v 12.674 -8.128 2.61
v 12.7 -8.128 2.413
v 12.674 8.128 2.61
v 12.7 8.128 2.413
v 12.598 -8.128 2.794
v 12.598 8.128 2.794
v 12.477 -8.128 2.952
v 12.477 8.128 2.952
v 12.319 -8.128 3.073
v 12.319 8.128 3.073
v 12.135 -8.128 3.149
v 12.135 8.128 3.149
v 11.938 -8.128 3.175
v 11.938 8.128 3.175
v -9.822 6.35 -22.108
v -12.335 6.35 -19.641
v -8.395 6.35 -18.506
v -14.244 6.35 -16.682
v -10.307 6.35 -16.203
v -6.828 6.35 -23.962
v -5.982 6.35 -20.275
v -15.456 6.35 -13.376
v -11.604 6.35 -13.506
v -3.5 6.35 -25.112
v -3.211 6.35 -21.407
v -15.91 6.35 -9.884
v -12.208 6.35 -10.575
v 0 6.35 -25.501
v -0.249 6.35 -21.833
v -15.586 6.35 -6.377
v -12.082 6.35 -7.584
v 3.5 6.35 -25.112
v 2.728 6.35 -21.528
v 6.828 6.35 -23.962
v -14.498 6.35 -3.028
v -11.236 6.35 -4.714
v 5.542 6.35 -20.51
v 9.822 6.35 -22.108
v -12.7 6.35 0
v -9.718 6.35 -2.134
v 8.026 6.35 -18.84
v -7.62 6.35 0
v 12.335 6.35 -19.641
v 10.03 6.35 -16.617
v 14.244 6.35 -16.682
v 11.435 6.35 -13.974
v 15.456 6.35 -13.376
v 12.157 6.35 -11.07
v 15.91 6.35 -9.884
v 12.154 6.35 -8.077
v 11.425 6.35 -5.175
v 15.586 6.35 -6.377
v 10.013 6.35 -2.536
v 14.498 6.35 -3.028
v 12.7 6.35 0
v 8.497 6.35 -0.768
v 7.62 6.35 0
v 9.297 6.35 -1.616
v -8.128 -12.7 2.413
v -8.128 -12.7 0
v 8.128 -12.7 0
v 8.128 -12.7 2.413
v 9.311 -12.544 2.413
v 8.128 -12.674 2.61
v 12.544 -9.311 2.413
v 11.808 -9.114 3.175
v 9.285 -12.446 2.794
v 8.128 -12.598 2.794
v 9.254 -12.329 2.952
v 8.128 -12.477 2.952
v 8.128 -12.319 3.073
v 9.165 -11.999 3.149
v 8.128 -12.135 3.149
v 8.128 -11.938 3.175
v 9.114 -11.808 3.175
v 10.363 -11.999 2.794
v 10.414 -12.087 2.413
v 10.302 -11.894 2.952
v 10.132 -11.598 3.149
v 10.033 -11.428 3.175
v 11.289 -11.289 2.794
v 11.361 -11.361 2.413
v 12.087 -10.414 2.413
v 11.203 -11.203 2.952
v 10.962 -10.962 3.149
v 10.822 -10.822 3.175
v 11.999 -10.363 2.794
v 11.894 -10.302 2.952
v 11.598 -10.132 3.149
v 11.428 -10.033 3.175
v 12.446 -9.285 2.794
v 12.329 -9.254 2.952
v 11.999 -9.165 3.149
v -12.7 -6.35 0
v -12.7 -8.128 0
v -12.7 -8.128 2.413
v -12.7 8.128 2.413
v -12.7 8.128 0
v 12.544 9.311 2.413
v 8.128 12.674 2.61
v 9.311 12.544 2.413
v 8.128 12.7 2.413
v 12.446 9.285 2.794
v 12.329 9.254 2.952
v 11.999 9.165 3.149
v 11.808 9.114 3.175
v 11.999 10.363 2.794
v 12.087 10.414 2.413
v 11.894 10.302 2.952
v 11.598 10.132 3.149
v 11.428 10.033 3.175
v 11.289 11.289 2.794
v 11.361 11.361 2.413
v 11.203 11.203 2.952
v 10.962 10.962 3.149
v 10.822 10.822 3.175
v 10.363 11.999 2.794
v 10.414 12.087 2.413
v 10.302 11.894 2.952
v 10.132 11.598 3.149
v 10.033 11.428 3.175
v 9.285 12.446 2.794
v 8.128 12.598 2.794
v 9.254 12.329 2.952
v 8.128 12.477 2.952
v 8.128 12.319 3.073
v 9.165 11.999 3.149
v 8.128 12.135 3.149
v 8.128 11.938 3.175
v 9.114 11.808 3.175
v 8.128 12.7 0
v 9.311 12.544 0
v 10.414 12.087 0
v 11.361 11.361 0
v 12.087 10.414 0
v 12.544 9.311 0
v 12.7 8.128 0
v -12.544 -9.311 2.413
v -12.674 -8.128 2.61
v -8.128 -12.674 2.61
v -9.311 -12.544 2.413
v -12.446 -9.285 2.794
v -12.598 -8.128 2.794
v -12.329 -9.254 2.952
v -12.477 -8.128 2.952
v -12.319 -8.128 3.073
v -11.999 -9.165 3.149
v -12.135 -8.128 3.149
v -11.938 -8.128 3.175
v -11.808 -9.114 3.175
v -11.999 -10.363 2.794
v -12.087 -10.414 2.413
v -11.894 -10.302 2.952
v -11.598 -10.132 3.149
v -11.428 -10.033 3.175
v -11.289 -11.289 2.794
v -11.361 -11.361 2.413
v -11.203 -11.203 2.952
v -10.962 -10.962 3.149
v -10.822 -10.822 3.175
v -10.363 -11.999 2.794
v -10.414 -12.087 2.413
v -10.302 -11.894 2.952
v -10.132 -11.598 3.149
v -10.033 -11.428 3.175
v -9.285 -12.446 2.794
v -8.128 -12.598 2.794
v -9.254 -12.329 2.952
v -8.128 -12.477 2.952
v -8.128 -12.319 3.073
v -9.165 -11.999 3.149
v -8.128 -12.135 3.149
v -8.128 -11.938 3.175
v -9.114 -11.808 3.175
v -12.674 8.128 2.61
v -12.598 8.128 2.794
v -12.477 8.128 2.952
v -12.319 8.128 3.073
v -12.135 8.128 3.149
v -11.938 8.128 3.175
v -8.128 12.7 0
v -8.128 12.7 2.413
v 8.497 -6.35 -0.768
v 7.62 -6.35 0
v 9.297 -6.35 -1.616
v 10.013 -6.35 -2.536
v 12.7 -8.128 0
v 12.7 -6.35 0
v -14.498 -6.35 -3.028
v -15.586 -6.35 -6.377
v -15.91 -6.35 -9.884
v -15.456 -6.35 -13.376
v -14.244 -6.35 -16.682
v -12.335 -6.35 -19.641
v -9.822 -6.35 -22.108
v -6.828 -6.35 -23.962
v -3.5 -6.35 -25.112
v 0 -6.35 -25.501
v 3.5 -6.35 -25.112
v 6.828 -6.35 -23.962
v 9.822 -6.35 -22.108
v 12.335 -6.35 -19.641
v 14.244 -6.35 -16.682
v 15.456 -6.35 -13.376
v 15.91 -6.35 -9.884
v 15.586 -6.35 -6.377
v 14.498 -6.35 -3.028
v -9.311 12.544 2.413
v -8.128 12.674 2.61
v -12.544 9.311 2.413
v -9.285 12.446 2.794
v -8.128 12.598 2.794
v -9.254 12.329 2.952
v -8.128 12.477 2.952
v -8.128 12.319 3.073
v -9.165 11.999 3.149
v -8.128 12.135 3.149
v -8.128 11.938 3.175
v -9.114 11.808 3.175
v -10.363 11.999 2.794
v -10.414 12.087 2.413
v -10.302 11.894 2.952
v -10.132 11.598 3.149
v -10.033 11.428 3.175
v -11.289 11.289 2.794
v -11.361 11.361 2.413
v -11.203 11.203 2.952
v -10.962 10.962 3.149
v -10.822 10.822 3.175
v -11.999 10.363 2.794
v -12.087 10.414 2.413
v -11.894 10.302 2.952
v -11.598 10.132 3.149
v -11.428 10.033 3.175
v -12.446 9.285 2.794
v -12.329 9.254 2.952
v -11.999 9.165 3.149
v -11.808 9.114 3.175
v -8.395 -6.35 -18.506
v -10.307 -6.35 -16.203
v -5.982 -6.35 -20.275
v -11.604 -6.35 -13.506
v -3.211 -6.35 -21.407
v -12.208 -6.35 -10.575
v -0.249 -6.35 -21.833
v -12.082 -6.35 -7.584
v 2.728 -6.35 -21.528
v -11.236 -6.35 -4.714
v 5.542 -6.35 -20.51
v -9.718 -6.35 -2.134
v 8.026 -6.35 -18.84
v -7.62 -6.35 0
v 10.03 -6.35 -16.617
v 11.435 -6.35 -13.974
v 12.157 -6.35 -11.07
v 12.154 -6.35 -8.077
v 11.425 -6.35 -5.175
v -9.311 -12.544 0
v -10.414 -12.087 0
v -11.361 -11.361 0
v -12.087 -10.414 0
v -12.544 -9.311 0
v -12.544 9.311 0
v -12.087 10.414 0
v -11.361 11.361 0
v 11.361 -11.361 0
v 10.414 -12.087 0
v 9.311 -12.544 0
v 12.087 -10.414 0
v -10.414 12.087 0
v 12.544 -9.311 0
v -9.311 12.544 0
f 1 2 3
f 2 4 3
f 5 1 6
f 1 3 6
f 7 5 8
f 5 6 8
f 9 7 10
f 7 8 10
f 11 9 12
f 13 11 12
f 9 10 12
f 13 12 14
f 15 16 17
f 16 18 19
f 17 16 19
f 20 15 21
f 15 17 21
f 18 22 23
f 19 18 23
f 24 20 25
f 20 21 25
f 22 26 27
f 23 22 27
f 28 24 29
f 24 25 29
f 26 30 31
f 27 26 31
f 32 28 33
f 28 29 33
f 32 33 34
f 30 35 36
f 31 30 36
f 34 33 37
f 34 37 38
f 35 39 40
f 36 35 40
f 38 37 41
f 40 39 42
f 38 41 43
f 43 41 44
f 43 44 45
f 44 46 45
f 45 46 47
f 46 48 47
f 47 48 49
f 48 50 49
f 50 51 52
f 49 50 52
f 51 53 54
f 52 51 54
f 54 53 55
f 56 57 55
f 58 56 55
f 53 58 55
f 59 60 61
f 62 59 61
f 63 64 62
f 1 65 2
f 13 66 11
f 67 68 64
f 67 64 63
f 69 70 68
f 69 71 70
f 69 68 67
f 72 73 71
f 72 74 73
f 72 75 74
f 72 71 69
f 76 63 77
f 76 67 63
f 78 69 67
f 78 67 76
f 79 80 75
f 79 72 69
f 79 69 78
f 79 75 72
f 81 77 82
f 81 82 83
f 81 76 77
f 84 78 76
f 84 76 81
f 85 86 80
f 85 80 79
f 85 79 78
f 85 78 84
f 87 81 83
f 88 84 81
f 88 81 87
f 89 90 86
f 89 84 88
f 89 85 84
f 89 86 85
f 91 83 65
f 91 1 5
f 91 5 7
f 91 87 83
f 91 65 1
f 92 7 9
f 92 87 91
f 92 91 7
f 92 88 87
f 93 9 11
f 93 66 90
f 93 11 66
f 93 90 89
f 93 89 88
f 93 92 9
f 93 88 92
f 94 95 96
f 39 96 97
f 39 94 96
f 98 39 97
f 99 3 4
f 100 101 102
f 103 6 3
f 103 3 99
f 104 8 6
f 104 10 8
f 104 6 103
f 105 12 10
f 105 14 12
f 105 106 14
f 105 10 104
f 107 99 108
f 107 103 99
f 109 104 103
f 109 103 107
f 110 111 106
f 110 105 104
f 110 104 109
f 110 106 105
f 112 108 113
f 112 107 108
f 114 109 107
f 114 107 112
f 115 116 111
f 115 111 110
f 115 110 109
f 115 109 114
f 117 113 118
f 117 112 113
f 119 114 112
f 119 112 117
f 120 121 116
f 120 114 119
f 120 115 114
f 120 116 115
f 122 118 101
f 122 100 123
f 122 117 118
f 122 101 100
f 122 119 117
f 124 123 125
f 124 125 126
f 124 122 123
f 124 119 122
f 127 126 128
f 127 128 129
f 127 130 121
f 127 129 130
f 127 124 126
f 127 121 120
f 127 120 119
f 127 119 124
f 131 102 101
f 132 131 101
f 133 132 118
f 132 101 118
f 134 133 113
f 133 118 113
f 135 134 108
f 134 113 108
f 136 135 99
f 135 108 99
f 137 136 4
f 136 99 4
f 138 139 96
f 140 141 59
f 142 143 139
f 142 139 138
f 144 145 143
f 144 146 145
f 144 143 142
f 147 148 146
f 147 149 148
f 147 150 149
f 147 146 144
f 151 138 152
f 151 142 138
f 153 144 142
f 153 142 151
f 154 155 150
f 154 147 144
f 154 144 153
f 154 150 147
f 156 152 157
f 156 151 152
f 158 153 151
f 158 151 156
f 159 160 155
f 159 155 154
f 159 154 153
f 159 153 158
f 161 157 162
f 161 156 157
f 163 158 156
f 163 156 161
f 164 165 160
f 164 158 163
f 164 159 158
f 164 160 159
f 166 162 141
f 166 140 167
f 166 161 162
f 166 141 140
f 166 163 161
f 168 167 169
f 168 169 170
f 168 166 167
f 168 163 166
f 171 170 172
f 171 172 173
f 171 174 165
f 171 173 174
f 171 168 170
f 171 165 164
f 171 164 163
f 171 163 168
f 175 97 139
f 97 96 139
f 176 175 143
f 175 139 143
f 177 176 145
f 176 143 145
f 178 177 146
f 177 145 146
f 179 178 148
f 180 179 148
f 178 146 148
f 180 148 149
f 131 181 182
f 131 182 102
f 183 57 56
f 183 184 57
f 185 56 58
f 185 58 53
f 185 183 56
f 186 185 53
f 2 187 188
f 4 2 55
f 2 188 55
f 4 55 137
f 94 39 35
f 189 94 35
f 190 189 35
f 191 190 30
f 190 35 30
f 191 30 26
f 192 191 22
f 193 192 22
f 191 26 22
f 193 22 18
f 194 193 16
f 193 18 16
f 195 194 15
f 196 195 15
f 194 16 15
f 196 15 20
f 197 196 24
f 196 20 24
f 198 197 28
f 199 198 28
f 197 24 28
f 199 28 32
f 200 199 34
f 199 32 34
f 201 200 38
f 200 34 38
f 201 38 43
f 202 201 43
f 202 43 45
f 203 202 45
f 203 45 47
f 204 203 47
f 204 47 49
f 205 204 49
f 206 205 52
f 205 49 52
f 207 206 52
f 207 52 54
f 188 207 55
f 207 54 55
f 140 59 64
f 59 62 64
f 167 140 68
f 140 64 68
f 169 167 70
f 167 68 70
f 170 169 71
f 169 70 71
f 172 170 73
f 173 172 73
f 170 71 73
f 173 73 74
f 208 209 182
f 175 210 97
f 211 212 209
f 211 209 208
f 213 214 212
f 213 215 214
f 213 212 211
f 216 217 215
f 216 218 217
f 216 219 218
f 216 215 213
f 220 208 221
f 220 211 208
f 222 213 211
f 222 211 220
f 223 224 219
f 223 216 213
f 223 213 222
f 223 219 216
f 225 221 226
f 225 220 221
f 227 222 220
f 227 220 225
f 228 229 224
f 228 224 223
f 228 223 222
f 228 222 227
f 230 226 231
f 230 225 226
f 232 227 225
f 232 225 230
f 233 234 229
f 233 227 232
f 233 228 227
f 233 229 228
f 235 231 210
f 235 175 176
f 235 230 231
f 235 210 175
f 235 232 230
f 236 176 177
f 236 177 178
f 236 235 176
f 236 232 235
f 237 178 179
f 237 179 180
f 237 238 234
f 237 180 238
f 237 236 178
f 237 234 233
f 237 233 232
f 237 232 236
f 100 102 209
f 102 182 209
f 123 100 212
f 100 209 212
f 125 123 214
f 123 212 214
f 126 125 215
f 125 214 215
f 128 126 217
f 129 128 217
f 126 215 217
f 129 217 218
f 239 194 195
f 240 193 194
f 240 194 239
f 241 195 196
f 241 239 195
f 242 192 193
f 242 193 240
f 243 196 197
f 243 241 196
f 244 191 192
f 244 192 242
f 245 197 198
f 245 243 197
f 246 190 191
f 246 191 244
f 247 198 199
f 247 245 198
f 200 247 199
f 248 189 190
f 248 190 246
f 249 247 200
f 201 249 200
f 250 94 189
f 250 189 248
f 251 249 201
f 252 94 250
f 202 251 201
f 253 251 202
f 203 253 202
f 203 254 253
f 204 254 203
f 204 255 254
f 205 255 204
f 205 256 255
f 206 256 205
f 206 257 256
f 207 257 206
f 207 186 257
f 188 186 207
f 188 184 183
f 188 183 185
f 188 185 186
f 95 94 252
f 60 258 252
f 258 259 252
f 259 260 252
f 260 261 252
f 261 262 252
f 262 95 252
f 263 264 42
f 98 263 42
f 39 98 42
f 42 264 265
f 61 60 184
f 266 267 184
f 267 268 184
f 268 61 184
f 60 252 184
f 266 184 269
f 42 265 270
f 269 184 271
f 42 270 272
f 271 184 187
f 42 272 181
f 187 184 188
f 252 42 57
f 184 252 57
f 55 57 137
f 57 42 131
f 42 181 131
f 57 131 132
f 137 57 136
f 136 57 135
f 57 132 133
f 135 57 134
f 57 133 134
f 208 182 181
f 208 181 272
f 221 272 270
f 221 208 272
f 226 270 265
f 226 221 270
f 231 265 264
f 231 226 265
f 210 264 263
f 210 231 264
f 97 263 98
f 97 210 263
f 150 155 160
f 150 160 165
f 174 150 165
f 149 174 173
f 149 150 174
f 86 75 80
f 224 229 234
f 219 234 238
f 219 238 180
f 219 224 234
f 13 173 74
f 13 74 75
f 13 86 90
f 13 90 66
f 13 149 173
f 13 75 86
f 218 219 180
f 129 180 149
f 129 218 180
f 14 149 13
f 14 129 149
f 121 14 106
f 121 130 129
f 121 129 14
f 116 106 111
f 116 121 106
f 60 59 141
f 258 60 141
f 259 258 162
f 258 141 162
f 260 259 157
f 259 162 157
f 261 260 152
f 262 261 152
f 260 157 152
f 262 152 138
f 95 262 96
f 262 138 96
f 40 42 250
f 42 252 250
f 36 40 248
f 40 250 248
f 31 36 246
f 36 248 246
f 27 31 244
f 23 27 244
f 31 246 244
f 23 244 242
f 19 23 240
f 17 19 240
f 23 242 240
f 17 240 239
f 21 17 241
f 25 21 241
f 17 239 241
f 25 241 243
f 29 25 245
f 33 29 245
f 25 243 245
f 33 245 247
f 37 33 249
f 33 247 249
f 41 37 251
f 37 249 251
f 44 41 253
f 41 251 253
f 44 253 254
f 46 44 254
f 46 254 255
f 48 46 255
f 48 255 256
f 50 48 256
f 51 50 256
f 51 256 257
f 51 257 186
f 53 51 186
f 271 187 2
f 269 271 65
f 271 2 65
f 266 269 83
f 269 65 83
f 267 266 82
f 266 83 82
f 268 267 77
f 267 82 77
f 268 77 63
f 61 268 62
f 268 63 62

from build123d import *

# Parameters (mm, degrees)
F0_W     = 25.4
F0_H     = 25.4
F1_DEPTH = 3.175
F3_W     = 5.08
F3_H     = 12.7
F6_DEPTH = 6.35
F7_R     = 4.572
F8_R     = 0.762


with BuildPart() as f1:
    # F0 (on Top) → F1 (new body)
    with BuildSketch(Plane.XY):
        Rectangle(F0_W, F0_H)
    extrude(amount=F1_DEPTH)

    # F4: sweep along a path in F2
    with BuildLine(Plane.XZ) as f4_path:
        ThreePointArc((-10.16, 0), (0, -23.55829), (10.16, 0))
    # F3 (on face) → F4 (sweep)
    with BuildSketch(Plane(origin=(0, 0, 0), x_dir=(1, 0, 0), z_dir=(0, 0, -1))):
        with Locations((-10.16, 0)):
            Rectangle(F3_W, F3_H)
    sweep(path=f4_path.line)

    # F5 (on Front) → F6 (join, symmetric)
    with BuildSketch(Plane.XZ):
        with BuildLine():
            Line((10.013058, -2.535746), (10.16, 0))
            Line((10.16, 0), (7.62, 0))
            ThreePointArc((7.62, 0), (8.907227, -1.182279), (10.013058, -2.535746))
        make_face()
    extrude(amount=F6_DEPTH, both=True)

    # F7
    f7_edges = [f1.edges().sort_by_distance(p)[0] for p in [
        (12.7, -12.7, 1.5875),
        (12.7, 12.7, 1.5875),
        (-12.7, 12.7, 1.5875),
        (-12.7, -12.7, 1.5875),
    ]]
    fillet(f7_edges, radius=F7_R)

    # F8
    f8_edges = [f1.edges().sort_by_distance(p)[0] for p in [
        (0, -12.7, 3.175),
        (-11.360892, -11.360892, 3.175),
        (11.360892, -11.360892, 3.175),
        (-12.7, 0, 3.175),
        (12.7, 0, 3.175),
        (-11.360892, 11.360892, 3.175),
        (11.360892, 11.360892, 3.175),
        (0, 12.7, 3.175),
    ]]
    fillet(f8_edges, radius=F8_R)


solid = f1.part
